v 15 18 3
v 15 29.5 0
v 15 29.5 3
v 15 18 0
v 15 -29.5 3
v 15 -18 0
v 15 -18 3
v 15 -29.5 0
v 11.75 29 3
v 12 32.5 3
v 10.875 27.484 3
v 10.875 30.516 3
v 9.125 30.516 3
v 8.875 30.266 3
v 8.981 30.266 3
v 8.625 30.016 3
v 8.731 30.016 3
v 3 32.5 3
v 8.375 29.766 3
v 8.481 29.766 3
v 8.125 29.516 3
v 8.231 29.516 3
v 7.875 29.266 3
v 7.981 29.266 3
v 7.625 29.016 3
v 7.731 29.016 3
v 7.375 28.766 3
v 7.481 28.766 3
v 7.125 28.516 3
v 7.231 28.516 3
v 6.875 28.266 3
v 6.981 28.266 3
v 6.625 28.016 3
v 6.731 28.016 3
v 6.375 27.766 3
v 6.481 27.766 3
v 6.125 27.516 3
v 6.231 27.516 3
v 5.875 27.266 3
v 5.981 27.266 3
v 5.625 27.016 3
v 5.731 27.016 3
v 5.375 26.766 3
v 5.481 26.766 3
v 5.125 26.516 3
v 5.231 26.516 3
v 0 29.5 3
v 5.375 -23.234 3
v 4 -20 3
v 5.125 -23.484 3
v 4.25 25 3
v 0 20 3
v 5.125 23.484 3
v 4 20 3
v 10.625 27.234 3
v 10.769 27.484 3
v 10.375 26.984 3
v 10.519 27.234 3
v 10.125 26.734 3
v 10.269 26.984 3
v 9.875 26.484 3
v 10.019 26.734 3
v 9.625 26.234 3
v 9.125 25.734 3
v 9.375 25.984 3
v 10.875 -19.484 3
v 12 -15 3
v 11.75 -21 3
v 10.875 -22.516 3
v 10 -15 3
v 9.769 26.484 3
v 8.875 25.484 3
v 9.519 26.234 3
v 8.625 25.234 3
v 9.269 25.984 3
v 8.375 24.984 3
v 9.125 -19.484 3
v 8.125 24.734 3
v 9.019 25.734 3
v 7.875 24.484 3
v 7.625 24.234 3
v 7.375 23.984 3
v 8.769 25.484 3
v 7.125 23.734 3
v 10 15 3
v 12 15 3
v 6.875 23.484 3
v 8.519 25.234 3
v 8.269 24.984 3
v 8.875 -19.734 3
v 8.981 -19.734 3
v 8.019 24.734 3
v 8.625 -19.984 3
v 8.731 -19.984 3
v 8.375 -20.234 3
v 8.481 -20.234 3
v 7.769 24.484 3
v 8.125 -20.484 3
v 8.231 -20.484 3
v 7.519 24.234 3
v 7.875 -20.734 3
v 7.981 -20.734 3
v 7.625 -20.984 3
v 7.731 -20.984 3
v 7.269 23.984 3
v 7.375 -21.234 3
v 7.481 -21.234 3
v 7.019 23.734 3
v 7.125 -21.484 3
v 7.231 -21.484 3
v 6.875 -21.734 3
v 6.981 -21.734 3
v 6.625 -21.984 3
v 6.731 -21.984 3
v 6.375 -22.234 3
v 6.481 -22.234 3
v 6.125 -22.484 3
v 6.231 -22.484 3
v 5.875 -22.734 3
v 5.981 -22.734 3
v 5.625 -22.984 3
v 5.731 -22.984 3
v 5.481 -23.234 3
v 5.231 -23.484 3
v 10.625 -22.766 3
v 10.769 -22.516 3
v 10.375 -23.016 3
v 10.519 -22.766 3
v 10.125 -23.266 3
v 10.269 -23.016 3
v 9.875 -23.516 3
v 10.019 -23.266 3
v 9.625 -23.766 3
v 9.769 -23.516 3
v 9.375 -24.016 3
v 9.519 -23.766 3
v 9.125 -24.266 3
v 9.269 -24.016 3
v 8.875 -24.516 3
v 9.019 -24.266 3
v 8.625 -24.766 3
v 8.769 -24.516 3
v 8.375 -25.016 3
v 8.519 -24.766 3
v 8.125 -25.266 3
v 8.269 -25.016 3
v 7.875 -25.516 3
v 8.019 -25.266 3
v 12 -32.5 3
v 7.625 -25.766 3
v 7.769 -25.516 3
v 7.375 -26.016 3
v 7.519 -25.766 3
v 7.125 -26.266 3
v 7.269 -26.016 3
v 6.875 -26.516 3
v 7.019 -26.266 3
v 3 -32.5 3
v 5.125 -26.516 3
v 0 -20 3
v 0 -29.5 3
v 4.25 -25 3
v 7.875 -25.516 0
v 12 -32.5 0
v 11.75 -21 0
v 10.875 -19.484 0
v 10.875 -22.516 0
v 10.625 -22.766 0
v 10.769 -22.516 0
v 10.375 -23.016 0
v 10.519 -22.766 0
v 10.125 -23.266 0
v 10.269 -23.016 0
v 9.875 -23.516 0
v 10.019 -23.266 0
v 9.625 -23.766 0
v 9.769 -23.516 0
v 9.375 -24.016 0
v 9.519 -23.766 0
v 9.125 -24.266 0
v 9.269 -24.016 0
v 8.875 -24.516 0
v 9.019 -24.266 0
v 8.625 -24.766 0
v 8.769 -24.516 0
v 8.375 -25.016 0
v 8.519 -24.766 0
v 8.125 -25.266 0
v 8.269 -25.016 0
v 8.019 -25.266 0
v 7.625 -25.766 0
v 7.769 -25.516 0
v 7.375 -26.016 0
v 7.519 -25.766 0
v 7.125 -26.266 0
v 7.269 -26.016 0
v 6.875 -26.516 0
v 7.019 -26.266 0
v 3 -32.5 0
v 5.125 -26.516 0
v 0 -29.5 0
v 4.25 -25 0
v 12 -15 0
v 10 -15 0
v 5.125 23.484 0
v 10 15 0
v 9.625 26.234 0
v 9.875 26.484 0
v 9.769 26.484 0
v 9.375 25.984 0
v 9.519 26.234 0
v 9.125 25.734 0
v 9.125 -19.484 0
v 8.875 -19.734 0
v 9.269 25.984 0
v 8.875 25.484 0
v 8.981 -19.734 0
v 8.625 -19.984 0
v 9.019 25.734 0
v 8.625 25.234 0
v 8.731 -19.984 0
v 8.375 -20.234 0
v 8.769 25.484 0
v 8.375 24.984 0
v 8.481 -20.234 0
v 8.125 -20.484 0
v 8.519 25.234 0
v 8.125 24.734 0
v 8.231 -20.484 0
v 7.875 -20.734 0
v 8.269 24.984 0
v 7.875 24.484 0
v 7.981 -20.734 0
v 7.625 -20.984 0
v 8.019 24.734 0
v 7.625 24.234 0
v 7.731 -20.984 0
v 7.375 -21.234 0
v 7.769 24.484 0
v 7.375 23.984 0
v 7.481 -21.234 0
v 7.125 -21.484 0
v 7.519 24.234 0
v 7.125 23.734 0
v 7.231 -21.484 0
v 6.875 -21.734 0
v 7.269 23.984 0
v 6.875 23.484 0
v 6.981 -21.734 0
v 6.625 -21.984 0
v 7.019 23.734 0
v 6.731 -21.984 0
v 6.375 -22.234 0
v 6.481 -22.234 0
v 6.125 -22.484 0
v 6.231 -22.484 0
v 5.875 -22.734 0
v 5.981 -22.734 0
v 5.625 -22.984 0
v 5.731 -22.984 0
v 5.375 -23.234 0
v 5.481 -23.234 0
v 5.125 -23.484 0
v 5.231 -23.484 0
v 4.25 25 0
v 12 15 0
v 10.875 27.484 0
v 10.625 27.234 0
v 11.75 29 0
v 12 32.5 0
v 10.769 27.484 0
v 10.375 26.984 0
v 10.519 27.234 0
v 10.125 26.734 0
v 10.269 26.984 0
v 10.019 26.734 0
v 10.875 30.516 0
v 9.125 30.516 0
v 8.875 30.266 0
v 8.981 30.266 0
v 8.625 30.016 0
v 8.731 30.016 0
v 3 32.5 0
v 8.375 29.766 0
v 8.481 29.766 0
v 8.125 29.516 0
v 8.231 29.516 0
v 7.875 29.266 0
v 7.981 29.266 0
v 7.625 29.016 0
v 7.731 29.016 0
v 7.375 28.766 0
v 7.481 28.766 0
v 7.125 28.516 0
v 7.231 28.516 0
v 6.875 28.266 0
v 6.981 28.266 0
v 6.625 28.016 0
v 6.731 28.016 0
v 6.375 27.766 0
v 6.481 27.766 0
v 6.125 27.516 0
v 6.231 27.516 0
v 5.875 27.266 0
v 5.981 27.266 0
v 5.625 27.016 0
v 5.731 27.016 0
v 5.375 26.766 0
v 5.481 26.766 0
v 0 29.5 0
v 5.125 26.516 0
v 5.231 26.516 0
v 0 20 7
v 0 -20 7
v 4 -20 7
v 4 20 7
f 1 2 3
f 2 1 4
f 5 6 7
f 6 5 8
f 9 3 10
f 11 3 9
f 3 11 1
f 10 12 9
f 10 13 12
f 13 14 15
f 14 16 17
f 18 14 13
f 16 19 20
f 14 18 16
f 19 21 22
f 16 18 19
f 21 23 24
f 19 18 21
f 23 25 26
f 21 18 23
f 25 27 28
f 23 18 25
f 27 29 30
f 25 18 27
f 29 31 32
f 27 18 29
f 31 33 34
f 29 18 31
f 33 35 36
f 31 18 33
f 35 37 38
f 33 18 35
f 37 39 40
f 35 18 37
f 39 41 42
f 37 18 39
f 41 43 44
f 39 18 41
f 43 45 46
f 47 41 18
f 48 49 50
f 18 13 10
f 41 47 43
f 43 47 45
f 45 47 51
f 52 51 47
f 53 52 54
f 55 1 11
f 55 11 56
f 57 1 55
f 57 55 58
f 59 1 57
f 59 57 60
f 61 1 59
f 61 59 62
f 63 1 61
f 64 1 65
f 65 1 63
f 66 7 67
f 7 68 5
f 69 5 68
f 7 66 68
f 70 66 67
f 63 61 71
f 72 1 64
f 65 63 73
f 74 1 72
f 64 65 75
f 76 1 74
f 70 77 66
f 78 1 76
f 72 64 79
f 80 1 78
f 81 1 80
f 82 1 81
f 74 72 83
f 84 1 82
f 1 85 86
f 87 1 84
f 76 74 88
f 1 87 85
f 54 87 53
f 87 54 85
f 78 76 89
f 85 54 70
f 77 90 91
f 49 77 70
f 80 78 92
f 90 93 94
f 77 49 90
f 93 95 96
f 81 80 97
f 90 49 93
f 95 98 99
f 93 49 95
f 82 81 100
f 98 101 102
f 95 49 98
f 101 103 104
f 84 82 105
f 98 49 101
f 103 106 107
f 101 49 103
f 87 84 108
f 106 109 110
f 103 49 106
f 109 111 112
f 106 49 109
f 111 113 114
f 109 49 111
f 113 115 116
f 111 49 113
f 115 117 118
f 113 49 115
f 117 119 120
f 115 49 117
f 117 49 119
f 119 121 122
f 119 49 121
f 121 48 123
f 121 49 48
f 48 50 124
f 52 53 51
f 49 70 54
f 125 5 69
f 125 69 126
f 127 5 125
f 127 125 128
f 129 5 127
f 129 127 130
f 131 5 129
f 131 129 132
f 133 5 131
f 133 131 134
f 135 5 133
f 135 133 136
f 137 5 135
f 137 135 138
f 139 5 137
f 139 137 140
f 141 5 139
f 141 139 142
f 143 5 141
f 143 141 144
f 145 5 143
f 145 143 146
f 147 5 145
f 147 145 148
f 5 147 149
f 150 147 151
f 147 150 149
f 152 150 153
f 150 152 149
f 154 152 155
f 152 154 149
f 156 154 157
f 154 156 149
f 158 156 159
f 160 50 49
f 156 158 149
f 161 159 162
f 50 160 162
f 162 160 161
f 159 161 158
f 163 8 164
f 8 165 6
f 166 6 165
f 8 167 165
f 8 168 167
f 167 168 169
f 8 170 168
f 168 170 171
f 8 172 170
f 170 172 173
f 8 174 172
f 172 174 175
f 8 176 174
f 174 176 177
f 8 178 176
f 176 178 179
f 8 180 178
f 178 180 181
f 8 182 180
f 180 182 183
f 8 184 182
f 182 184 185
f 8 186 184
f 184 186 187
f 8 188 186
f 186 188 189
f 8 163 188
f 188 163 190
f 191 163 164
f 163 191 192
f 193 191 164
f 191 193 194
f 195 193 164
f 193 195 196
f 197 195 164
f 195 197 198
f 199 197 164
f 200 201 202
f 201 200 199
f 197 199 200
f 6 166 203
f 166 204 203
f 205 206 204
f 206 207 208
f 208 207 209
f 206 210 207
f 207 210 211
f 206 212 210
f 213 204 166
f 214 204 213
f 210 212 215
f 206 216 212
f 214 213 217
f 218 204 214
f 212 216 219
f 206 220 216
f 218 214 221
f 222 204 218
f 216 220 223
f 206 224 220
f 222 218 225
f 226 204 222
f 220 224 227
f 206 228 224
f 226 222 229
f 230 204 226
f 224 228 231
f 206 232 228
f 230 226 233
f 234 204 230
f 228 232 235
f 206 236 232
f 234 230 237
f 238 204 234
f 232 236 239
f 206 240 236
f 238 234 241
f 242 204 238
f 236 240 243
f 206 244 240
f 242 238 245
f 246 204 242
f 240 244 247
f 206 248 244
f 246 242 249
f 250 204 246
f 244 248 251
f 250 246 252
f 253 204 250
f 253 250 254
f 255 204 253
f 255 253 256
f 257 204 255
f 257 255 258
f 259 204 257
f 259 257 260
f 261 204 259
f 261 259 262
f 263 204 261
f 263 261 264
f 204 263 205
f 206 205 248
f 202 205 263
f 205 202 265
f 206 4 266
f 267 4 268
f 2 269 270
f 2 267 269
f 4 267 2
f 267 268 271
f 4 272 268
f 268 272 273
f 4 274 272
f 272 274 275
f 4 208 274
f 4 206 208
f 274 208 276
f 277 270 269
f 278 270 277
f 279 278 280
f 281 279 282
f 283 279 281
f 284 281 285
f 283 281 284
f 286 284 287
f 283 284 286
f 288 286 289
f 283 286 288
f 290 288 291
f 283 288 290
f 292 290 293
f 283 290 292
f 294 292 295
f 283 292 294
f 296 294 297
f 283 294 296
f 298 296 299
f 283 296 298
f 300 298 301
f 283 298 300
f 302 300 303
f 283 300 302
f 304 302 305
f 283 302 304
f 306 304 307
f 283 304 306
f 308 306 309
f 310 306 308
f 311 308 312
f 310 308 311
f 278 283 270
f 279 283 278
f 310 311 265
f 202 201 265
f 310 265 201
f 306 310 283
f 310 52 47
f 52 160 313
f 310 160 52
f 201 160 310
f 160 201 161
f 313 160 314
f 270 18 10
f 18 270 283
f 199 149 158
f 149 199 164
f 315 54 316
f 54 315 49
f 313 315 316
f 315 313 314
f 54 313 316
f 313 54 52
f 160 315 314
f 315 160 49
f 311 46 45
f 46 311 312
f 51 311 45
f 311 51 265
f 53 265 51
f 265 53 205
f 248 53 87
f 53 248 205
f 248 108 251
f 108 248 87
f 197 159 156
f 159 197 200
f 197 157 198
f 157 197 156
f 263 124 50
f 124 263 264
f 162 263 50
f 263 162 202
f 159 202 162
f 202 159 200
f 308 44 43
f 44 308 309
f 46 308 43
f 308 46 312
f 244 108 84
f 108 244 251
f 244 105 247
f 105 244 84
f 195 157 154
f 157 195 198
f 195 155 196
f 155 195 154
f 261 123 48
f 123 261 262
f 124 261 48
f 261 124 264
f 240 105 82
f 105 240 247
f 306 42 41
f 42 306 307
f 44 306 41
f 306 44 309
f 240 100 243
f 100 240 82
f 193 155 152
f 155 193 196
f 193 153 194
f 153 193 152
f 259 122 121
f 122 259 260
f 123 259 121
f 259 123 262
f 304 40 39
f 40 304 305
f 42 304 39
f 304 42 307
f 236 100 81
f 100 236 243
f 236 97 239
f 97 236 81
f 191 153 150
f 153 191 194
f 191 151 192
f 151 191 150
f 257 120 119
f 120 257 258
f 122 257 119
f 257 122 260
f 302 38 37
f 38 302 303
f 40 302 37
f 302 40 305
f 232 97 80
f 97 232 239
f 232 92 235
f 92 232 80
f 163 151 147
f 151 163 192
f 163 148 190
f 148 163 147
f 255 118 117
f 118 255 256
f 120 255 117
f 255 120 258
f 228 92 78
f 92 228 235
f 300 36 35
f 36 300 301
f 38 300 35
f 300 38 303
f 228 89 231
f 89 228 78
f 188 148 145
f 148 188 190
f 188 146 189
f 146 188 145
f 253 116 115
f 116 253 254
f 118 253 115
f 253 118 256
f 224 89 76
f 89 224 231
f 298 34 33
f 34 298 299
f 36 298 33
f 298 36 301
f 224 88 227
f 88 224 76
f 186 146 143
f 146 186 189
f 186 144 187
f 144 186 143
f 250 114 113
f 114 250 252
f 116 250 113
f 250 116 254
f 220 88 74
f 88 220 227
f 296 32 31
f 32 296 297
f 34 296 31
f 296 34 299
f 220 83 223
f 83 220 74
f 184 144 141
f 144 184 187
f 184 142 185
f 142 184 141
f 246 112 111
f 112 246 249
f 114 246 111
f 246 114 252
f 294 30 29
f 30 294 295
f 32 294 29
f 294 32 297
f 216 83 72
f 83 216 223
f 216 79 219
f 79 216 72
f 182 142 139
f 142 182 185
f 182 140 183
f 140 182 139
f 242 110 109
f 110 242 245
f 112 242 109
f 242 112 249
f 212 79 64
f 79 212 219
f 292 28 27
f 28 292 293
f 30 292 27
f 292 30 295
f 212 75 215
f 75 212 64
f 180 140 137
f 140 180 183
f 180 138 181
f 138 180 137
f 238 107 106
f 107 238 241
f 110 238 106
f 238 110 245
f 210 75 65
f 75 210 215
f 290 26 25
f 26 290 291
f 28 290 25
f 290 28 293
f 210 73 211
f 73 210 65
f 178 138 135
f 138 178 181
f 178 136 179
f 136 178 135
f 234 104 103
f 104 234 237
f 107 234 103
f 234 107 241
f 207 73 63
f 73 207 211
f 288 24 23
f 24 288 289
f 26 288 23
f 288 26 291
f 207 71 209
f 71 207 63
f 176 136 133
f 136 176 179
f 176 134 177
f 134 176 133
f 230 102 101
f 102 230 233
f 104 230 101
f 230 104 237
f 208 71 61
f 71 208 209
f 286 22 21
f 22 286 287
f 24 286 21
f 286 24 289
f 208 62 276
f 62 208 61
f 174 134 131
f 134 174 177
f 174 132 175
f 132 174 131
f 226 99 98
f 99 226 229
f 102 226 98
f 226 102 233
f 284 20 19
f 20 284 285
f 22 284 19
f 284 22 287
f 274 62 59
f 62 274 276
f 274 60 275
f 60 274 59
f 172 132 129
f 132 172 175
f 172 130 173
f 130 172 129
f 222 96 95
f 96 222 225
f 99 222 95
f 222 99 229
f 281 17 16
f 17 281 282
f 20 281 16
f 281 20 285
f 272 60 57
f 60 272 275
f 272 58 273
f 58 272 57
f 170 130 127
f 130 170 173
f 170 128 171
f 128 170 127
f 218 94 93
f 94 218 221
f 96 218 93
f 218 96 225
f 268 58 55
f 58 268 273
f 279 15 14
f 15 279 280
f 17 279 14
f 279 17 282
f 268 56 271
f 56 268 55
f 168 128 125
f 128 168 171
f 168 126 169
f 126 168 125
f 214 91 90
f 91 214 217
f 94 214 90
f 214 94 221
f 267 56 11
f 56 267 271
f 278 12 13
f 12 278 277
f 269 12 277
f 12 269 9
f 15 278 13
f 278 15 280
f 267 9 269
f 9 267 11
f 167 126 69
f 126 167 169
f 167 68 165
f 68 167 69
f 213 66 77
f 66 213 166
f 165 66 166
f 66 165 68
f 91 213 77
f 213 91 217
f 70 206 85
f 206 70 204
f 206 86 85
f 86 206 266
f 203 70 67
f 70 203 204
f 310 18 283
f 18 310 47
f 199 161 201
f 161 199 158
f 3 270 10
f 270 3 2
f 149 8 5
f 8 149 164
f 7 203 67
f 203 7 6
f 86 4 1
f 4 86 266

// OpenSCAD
// file: config_4x5.scad
/*
This is the base configuration file for the 4x5" format
# we are not using the exact ANSI measures, but slightly rounded measures for slight simplification
*/
vStabilizerTotal_h = 7;

// general tolerance
vTolerance = 0.2;

// sheet film and cassette measurements (roughly based on the ANSI measurements)
vFilmSheet_l = 127;
vFilmSheet_w = 102;
vCassette_l = 160; // A min
vCassette_w = 121; // B max
vCassette_h = 13.2; // C max
vLightTrap_l = 2; // M2
vLightTrap_w = vCassette_w;
vLightTrap_h = 1.5; // M1
vLightTrap_offsetX = 141; // G max
vFilmWindow_l = 121;
vFilmWindow_w = 101;
vFilmWindow_offsetX = 16;
vGroundGlass_offsetZ = 5;

// Graflok
vGraflok_h = 6; // this is not the official measurement, just measured from a camera 

// lens board measures (we are using Wista/Technika-style lensboards)
vLensboard_l = 100;
vLensboard_w = 97;
vLensboard_h = 2;
vLensboard_offsetX = -(vLensboard_l+3)/2; // caution: we have an asymetric offset!
vLensboard_offsetY = -vLensboard_w/2;
vLensboardHole_d = 85;
vLensboardLighttrap_d = 89;
vLensboardLighttrap_h = 1+vTolerance;

// bellows frame measures - the bellows frame design is derived from standardcameras.com
// back frame
vBellowsBackInner_l = 144; //???? check and replace with the measurement from your bellows!
vBellowsBackInner_w = vBellowsBackInner_l;
vBellowsBackOuter_l = vBellowsBackInner_l+1;
vBellowsBackOuter_w = vBellowsBackOuter_l;

vBellowsBackFrameOuter_l = 159;
vBellowsBackFrameOuter_w = vBellowsBackFrameOuter_l;
vBellowsBackFrameOuter_h = 7;
vBellowsBackFrameInner_l = 135;
vBellowsBackFrameInner_w = vBellowsBackFrameInner_l;
vBellowsBackFrameInner_h = 5;

vBellowsBackLightTrapOuter_l = vBellowsBackFrameInner_l+2*2;
vBellowsBackLightTrapOuter_w = vBellowsBackLightTrapOuter_l;
vBellowsBackLightTrap_h = 3;

//vBellowsBackFrameScrewHole_d = 2;
//vBellowsBackFrameScrewHole_h = 10;
vBellowsBackFrameScrewHole_offsetXY = 70;
vBellowsBackFrameScrewHole_offsetZ = vBellowsBackFrameOuter_h/2;

// front frame
vBellowsFrontInner_l = 94; //???? check and replace with the measurement from your bellows!
vBellowsFrontInner_w = vBellowsFrontInner_l;
vBellowsFrontOuter_l = vBellowsFrontInner_l+1;
vBellowsFrontOuter_w = vBellowsFrontOuter_l;

vBellowsFrontFrameOuter_l = 104;
vBellowsFrontFrameOuter_w = vBellowsFrontFrameOuter_l;
vBellowsFrontFrameOuter_h = 7;
vBellowsFrontFrameInner_l = 82;
vBellowsFrontFrameInner_w = vBellowsFrontFrameInner_l;
vBellowsFrontFrameInner_h = 5;

vBellowsFrontLightTrapOuter_l = vBellowsFrontFrameInner_l+2*2;
vBellowsFrontLightTrapOuter_w = vBellowsFrontLightTrapOuter_l;
vBellowsFrontLightTrap_h = 0;

//vBellowsFrontFrameScrewHole_d = 2;
//vBellowsFrontFrameScrewHole_h = 10;
vBellowsFrontFrameScrewHole_offsetXY = 40;
vBellowsFrontFrameScrewHole_offsetZ = vBellowsFrontFrameOuter_h/2;

// body dimensions
vWall_strength = 5;
vBodyOuter_l = 185; // make sure this is at least 4*vWall_strength larger than vBellowsBackFrameOuter_l!
vBodyOuter_w = 170; // make sure this is at least 2*vWall_strength larger than vBellowsBackFrameOuter_l!
vBodyOuter_h = 65;
vBodyEdge_r = vWall_strength;

// we will center our model on the Y axis and on the center of the bellows frame
// at least for the 4x5 version, we have to do an asymetric offset of 2.5mm on the X-axis 
vAsymOffsetX = -2.5;  

// back plate
vBackPlateLength = 160; // we will probably use about the same size as the bellows back frame
vBackPlateStrength = vWall_strength;

// hinges for front lid
vHingeInnerDistance = 100;
vHingeBaseWidth = 20;
vHingeHole = 4;

// lid lock measures
vLidLockBase_d = 8;
vLidLockHole_distance = 70;

// rail dimensions
vLowerRail_w = 90;
vUpperRail_w = vLowerRail_w;

// cutout for stop indents
vStopIndent_l = 4;
vStopIndent_h = 5;
vStopIndentDistance = 25; // shorter than 25 is not necessary
vStopIndent_offsetX = 20; // don't go shorter than 20 if you intend to use a 90mm lens!

// for all dovetails we use a base width of 5mm and a base height of 5mm
// we are applying tolerances to the inner AND outer part of a dovetail, in width and height
vDoveTail_w = 5;
vDoveTail_h = 5;
vDoveTail_tolerance = 0.2;

// front standard carrier / slider
// width is depending on vUpperRail_w
vSliderBase_w = vUpperRail_w + (4*vDoveTail_w);
vSliderBase_l = 40; // make sure to have enough space in the body.


// lever plate 
vLeverPlateBase_w = vUpperRail_w - (8*vDoveTail_w);
vLeverPlateBlock_w = 25;
vLeverPlateBlock_l = vSliderBase_l-(2*vDoveTail_w);

vFrontStandard_h = 130;
vFrontStandardSlot_h = vFrontStandard_h - 30;

// lensboard carrier
vFrontPlate_length = vSliderBase_w+6; // vSliderBase_w is a bit too tight for 4x5", so there we will add 5mm, for 5x7 vSliderBase_w is OK to get a squared lensboard carrier
vFrontPlate_width = vSliderBase_w; //vFrontPlate_length;
vFrontPlate_height = 16;
vEdgeCutCylinder = floor(sqrt(2*pow(vFrontPlate_width,2)))-5;

vTiltDovetailBase_d1 = 30;
vTiltDovetailBase_d2 = vTiltDovetailBase_d1+(2*vDoveTail_w);
vTiltDovetailBaseBlock_d = vTiltDovetailBase_d1+(4*vDoveTail_w);

vTiltDovetail_d1 = vTiltDovetailBase_d1-vTolerance;
vTiltDovetail_d2 = vTiltDovetailBase_d2-vTolerance;
vTiltDovetail_h = vDoveTail_w-vTolerance;

vTiltDovetailCutout_d1 = vTiltDovetailBase_d2+vTolerance;
vTiltDovetailCutout_d2 = vTiltDovetailBase_d1+vTolerance;

vAxisHole_d = 10+vTolerance;
vAxisHole_h = vDoveTail_w+vTolerance;

vTiltLockBolt_d = 12;
vTiltLockBolt_h = 14;
//vTiltLockBoltHole_d = 8;
//vTiltLockBoltHole_h = vTiltLockBolt_h;

vTiltHeight = 50;
vTiltRadius = vFrontPlate_length/2;
vTiltAngleMinus = -7;
vTiltAnglePlus = 7;
vTiltAxis_d = 10-vTolerance;

// focusing rod
vFocusingRod_d = 6;
vFocusingKnob_d = 25;
vFocusingKnob_h = 20;

// stabilizer measures (just the outer measures of our stabilizer block, not the tripod slider)
vStabilizerBase_l = 135;
vStabilizerBase_w = 90;  
vStabilizerBase_h = 7;
vStabilizerDovetailBase_w = 50;
// screw holes for the stabilizer
vLidHoleCount_x = 4;
vLidHoleDist_x = 35;
vLidHoleCount_y = 2;
vLidHoleDist_y = 60;


// screw diameters, length is individually set
vScrew1Hole_d = 3;
vScrew1ThreadHole_d = 2.2;
vScrew2Hole_d = 2;
vScrew2ThreadHole_d = 1.4;


// Dimensions for small heat set insert holes.
// Sized for M2 inserts, 3 mm depth, 3.5 mm max OD
// (may be labelled M2x3.5x3)
vInsertM2Hole_d = 3.2;
vInsertM2MinDepth_h = 4.0;
vInsertM2Size_d = 3.5;
vInsertM2Depth_h = 3.0;

// Dimensions for heat set insert holes.
// Sized for "Voron standard" M3 inserts, 4 mm depth, 5 mm max OD
// (variously labelled M3x4x5 or M3x5x4)
vInsertM3Hole_d = 4.7;
vInsertM3MinDepth_h = 5.0;
vInsertM3Size_d = 5.0;
vInsertM3Depth_h = 4.0;

// Dimensions for large heat set insert holes.
// Sized for M5 inserts, 5 mm depth, 7 mm max OD
// (may be labelled M5x7x5)
vInsertM5Hole_d = 6.7;
vInsertM5MinDepth_h = 6.0;
vInsertM5Size_d = 7.0;
vInsertM5Depth_h = 5.0;
// file: baseconfig.scad
/*
Here we define some variables which are independent from the camera format
*/


// some generic variables

// we are including a format specific configuration sheet - but make sure to include only one!

include <config_4x5.scad>;
// include <config_5x7.scad>;
// include <config_8x10.scad>;

// Arca Swiss tripod plate
// caution: some Arca Swiss compatible tripod heads may have slight variations
// vArca_length = xx; // the length is irrelevant here
vArca_width = 38;
vArca_height = 7;
vArcaBase_cutout = 4;
vArcaBase_height = 1.5;
// file: modules.scad
/*
This is a collection of the modules which are used heavily within the whole project.
Almost all parts rely on the modules to remain "as is", especially regarding their current orientation.
So please act very carefully here, otherwise you may screw up the complete design!

*/
include <baseconfig.scad>;


// roof module - this is heavily used for dovetail cutouts
// please keep as is
module roof(l, w, h){
    polyhedron(
        points=[
            [0,0,0],
            [l,0,0],
            [l,w,0],
            [0,w,0],
            [0,w/2,h],
            [l,w/2,h]
            ],
        faces=[
            [0,1,2,3],
            [0,4,1],
            [1,4,5,2],
            [2,5,3],
            [3,5,4,0]
            ]
            );
    };

// a wedge module - this is heavily used for cutting edges
// please keep as is    
module wedge(l, w, h) {
    polyhedron(
            points=[
                [0,0,0],
                [l,0,0],
                [l,w,0],
                [0,w,0],
                [0,0,h],
                [l,0,h]
            ],
            faces=[
                [0,3,2,1],
                [0,1,5,4],
                [1,2,5],
                [2,3,4,5],
                [3,0,4]
            ]
    );
   };

// simple tube module.   
module tube(d1, d2, h) {
    difference() {
        cylinder(d=d1, h=h);
        cylinder(d=d2, h=h);
        };
    };

// mainly used for making holes for countersunk screws
// please keep as is    
module countersunk_screw(vScrew_d, vScrew_l){
    union(){
    cylinder(d=vScrew_d, h=vScrew_l);
    cylinder(d1=vScrew_d*2, d2=0, h=vScrew_d);
    };
};

// module for making hexagons, e.g. hex nuts. kw is the key width
// please keep as is
module hex(kw, h) {
	render()
        translate([0, 0, h/2])
            intersection_for(a = [0, 120, 240]) {
                rotate([0, 0, a])
                    cube([kw, 3 * kw, h], true);
                }
}


// Heatset insert
// d: Thread diameter
// od: Outer diameter
// l: Total length
module insert(d, od, l)
{
    echo(Insert = d, od, l);
    difference() {
        cylinder(l, d=od, $fn=15);
        translate([0, 0, -0.5]) cylinder(l+1, d=d, $fn=15);
        };
}

module insert_m2()
{
    color("gold") insert(2, vInsertM2Size_d, vInsertM2Depth_h);
}

module insert_m3()
{
    color("gold") insert(3, vInsertM3Size_d, vInsertM3Depth_h);
}

module insert_m5()
{
    color("gold") insert(5, vInsertM5Size_d, vInsertM5Depth_h);
}

// Countersunk screw, metric, for display
// Example: https://www.aliexpress.com/item/1005007838338973.html
module screw_cs(l, d=3, dk=6, s=2, t=1) {
    // l: total length (including head) in mm
    // d: thread diameter (eg 3 for M3)
    // dk: max head diameter
    // s: hex socket flat-to-flat size
    // t: hex socket depth
    echo(CountersunkScrew = d, l);
    difference() {
        union() {
            cylinder(h=l, r=d/2, $fn=15);
            cylinder(h=(dk-d)/2, r1=dk/2, r2=d/2, $fn=15);
            }
        cylinder(h=t, r=s/2*2/sqrt(3), $fn=6);
    }
}

module screw_m3_cs(l) {
    color("silver") screw_cs(l, d=3, dk=6, s=2, t=1);
}

module screw_m2_cs(l) {
    color("silver") screw_cs(l, d=2, dk=3.8, s=1.5, t=0.75);
}
module screw_m5_cs(l) {
    color("silver") screw_cs(l, d=5, dk=9.5, s=3, t=1.6);
}

// Button head screw, metric, for display
// Example: https://www.aliexpress.com/item/32967225441.html
module screw_bh(l, d=3, k=1.5, dk=5.5, s=2, t=1) {
    // l: shaft length (NOT including head) in mm
    // d: thread diameter (eg 3 for M3)
    // k: head depth
    // dk: head max diameter
    // s: hex socket flat-to-flat size
    // t: hex socket depth
    echo(ButtonheadScrew = d, l);
    difference() {
        union() {
            translate([0, 0, k]) cylinder(h=l, r=d/2, $fn=15);
            difference() {
                translate([0, 0, k]) intersection() {
                    sphere(d=dk, $fn=15);
                    translate([-dk/2, -dk/2, -dk]) cube(dk);
                }
                translate([-dk/2, -dk/2, -dk]) cube(dk);
            }
        }
        cylinder(h=t, r=s/2*2/sqrt(3), $fn=6);
    }
}

module screw_m2_bh(l) {
    color("silver") screw_bh(l, d=2, dk=3.4, s=1.175, t=0.6);
}

module screw_m3_bh(l) {
    color("silver") screw_bh(l, d=3, dk=5.7, s=2, t=1);
}


module nut_m5() {
    echo(Nut = 5);
    difference() {
        rotate([0, 0, 30]) cylinder(h=3.9, d=8*2/sqrt(3), $fn=6);
        cylinder(h=5, d=5, $fn=15);
        }
    }
    
    
module thumbscrew(bolt_d, bolt_dk, screw_d, screw_h, n_knurls, knurl_d, knurl_f) {
    // bolt_d:  central bolt diameter
    // bolt_dk: bolt head max diameter
    // screw_d: thumbscrew outer diameter
    // screw_h: thumbscrew height
    // n_knurls: number of knurls
    
    min_knurl_offset = screw_d/2 - knurl_d;
    max_knurl_offset = screw_d/2 + knurl_d;
    knurl_offset = min_knurl_offset + knurl_f*(max_knurl_offset - min_knurl_offset);
    
    difference()
    {
        union()
        {
            translate([0, 0, 1]) cylinder(screw_h-2, d=screw_d);
            cylinder(1, d1=screw_d-1, d2=screw_d);
            translate([0, 0, screw_h-1]) cylinder(1, d1=screw_d, d2=screw_d-1);
        }
        cylinder(screw_h, d=bolt_d);
        cylinder(bolt_dk/2, d1=bolt_dk, d2=0);
        for (i = [1:n_knurls])
        {
            rotate([0, 0, i*360/(n_knurls)]) translate([knurl_offset, 0, 0]) cylinder(screw_h, d=knurl_d);
        }
    }
}

module thumbscrew_m5(screw_d, screw_h, n_knurls, knurl_d, knurl_f) {
    thumbscrew(5, 9.5, screw_d, screw_h, n_knurls, knurl_d, knurl_f);
}


module t6_flange_coupler() {
    // T6 flange coupler
    // Example: https://www.aliexpress.com/item/1005008049363389.html
    echo(FlangeCoupler = 6);
    difference() {
        union() {
            translate([0, 0, 2]) cylinder(h=10, d=10);
            cylinder(h=2, d=22);
        }
        cylinder(h=12, d=6);
        translate([0, 15, 7]) rotate([90, 0, 0]) cylinder(h=30, d=3);
        for (i = [0:3]) {
            rotate([0, 0, 45+90*i]) translate([-8, 0, 0]) cylinder(h=2, d=3);
        }
    }
}


module AXK0619_thrust_bearing() {
    echo(ThrustBearing = "AXK0619");
    difference() {
        cylinder(h=4, d=19);
        cylinder(h=4, d=6);
    }
}


module t6_lead_screw(l) {
    echo(LeadScrewT6 = l);
    color("silver") cylinder(h=l, d=6);
}

module t6_lead_screw_nut() {
    echo("LeadScrewT6Nut");
    intersection()
    {
        difference() {
            union() {
                cylinder(h=15, d=12);
                translate([0, 0, 1.5]) cylinder(h=3.5, d=24);
            }
            cylinder(h=15, d=6);
        }  
        translate([-50, -12.5/2, -50]) cube([100, 12.5, 100]);
    }
}

module threaded_rod_m5(l) {
    echo(ThreadedRodM5 = l);
    color("silver") cylinder(h=l, d=5);
}

module smooth_rod_m4(l) {
    echo(SmoothRodM4 = l);
    color("silver") cylinder(h=l, d=4);
}


module screw_m3_grub(l) {
    echo(GrubScrew = 3, l);
    color("silver") cylinder(h=l, d=3, $fn=15);
}


module screw_m5_grub(l) {
    echo(GrubScrew = 5, l);
    color("silver") cylinder(h=l, d=5, $fn=15);
}


module washer_m6() {
    // M6x12x0.8 washer
    echo(Washer = 6, 0.8);
    difference() {
        cylinder(h=0.8, d=12);
        cylinder(h=0.8, d=6.6);
    }
}


module springwasher_m6() {
    // M6x12x1.5 washer (compresses to 0.5)
    // Show as compressed (~0.5 mm height)
    echo(SpringWasher = 6);
    difference() {
        cylinder(h=0.5, d=12);
        cylinder(h=0.6, d=6);
    }
}
// main file
// some modules such as hex, countersunk screws, roof, wedge are available in a module file
use <modules.scad>;


module lensboard_upper_clamp() {

// variables

vClampBase_l = 15;
vClampBase_w = 65;
vClampBase_h = 3;
vClampBase_offsetX = 0;
vClampBase_offsetY = -vClampBase_w/2;
vClampBase_offsetZ = 0;

vClampCutout_l = 5;
vClampCutout_w = 30;
vClampCutout_h = vClampBase_h;
vClampCutout_offsetX = 10;
vClampCutout_offsetY = -vClampCutout_w/2;
vClampCutout_offsetZ = 0;

vClampGrip_l = 4;
vClampGrip_w = 40;
vClampGrip_h = 4;
vClampGrip_offsetX = 0;
vClampGrip_offsetY = -vClampGrip_w/2;
vClampGrip_offsetZ = vClampBase_h;


vScrewHole_d = 3.5;
vScrewHole_h = vClampBase_h;
vScrewHole_offsetX = 6;
vScrewHole_offsetY = 25;
vScrewHole_offsetZ = 0;

vEdgeCut = 3;
vEdgeCut_h = vClampBase_h;
vEdgeCut_offsetX1 = 0;
vEdgeCut_offsetX2 = vClampBase_l;
vEdgeCut_offsetY1 = vClampBase_w/2;
vEdgeCut_offsetY2 = vClampCutout_w/2;
vEdgeCut_offsetZ = 0;



difference(){
    union(){
    // base plate
    translate([vClampBase_offsetX, vClampBase_offsetY, vClampBase_offsetZ])
        cube([vClampBase_l, vClampBase_w, vClampBase_h]);
    // grip
    translate([vClampGrip_offsetX, vClampGrip_offsetY, vClampGrip_offsetZ])
        cube([vClampGrip_l, vClampGrip_w, vClampGrip_h]);    
    };
    
    // cutout
    translate([vClampCutout_offsetX, vClampCutout_offsetY, vClampCutout_offsetZ])
        cube([vClampCutout_l, vClampCutout_w, vClampCutout_h]);
    
    // screw holes
    translate([vScrewHole_offsetX, vScrewHole_offsetY, vScrewHole_offsetZ])
        cylinder(d=vScrewHole_d, h=vScrewHole_h);
    translate([vScrewHole_offsetX, -vScrewHole_offsetY, vScrewHole_offsetZ])
        cylinder(d=vScrewHole_d, h=vScrewHole_h);
    
    for (i=[0:0.25:4]){
        translate([vScrewHole_offsetX+i, vScrewHole_offsetY+i, vScrewHole_offsetZ])
            cylinder(d=vScrewHole_d, h=vScrewHole_h);
        translate([vScrewHole_offsetX+i, -vScrewHole_offsetY+i, vScrewHole_offsetZ])
            cylinder(d=vScrewHole_d, h=vScrewHole_h);
    };
    
    
    
    
    
    
    
    // edge cut
    translate([vEdgeCut_offsetX1, vEdgeCut_offsetY1, vEdgeCut_offsetZ])
        rotate([0, 270, 0])
            wedge(vEdgeCut_h, -vEdgeCut, -vEdgeCut);
    
    translate([vEdgeCut_offsetX1, -vEdgeCut_offsetY1, vEdgeCut_offsetZ])
        rotate([0, 270, 0])
            wedge(vEdgeCut_h, vEdgeCut, -vEdgeCut);
    
    translate([vEdgeCut_offsetX2, vEdgeCut_offsetY1, vEdgeCut_offsetZ])
        rotate([0, 270, 0])
            wedge(vEdgeCut_h, -vEdgeCut, vEdgeCut);
    
    translate([vEdgeCut_offsetX2, -vEdgeCut_offsetY1, vEdgeCut_offsetZ])
        rotate([0, 270, 0])
            wedge(vEdgeCut_h, vEdgeCut, vEdgeCut);
            
    translate([vEdgeCut_offsetX2, -vEdgeCut_offsetY2, vEdgeCut_offsetZ])
        rotate([0, 270, 0])
            wedge(vEdgeCut_h, -vEdgeCut, vEdgeCut);
    
    translate([vEdgeCut_offsetX2, vEdgeCut_offsetY2, vEdgeCut_offsetZ])
        rotate([0, 270, 0])
            wedge(vEdgeCut_h, vEdgeCut, vEdgeCut);        
    
}

};

lensboard_upper_clamp();
